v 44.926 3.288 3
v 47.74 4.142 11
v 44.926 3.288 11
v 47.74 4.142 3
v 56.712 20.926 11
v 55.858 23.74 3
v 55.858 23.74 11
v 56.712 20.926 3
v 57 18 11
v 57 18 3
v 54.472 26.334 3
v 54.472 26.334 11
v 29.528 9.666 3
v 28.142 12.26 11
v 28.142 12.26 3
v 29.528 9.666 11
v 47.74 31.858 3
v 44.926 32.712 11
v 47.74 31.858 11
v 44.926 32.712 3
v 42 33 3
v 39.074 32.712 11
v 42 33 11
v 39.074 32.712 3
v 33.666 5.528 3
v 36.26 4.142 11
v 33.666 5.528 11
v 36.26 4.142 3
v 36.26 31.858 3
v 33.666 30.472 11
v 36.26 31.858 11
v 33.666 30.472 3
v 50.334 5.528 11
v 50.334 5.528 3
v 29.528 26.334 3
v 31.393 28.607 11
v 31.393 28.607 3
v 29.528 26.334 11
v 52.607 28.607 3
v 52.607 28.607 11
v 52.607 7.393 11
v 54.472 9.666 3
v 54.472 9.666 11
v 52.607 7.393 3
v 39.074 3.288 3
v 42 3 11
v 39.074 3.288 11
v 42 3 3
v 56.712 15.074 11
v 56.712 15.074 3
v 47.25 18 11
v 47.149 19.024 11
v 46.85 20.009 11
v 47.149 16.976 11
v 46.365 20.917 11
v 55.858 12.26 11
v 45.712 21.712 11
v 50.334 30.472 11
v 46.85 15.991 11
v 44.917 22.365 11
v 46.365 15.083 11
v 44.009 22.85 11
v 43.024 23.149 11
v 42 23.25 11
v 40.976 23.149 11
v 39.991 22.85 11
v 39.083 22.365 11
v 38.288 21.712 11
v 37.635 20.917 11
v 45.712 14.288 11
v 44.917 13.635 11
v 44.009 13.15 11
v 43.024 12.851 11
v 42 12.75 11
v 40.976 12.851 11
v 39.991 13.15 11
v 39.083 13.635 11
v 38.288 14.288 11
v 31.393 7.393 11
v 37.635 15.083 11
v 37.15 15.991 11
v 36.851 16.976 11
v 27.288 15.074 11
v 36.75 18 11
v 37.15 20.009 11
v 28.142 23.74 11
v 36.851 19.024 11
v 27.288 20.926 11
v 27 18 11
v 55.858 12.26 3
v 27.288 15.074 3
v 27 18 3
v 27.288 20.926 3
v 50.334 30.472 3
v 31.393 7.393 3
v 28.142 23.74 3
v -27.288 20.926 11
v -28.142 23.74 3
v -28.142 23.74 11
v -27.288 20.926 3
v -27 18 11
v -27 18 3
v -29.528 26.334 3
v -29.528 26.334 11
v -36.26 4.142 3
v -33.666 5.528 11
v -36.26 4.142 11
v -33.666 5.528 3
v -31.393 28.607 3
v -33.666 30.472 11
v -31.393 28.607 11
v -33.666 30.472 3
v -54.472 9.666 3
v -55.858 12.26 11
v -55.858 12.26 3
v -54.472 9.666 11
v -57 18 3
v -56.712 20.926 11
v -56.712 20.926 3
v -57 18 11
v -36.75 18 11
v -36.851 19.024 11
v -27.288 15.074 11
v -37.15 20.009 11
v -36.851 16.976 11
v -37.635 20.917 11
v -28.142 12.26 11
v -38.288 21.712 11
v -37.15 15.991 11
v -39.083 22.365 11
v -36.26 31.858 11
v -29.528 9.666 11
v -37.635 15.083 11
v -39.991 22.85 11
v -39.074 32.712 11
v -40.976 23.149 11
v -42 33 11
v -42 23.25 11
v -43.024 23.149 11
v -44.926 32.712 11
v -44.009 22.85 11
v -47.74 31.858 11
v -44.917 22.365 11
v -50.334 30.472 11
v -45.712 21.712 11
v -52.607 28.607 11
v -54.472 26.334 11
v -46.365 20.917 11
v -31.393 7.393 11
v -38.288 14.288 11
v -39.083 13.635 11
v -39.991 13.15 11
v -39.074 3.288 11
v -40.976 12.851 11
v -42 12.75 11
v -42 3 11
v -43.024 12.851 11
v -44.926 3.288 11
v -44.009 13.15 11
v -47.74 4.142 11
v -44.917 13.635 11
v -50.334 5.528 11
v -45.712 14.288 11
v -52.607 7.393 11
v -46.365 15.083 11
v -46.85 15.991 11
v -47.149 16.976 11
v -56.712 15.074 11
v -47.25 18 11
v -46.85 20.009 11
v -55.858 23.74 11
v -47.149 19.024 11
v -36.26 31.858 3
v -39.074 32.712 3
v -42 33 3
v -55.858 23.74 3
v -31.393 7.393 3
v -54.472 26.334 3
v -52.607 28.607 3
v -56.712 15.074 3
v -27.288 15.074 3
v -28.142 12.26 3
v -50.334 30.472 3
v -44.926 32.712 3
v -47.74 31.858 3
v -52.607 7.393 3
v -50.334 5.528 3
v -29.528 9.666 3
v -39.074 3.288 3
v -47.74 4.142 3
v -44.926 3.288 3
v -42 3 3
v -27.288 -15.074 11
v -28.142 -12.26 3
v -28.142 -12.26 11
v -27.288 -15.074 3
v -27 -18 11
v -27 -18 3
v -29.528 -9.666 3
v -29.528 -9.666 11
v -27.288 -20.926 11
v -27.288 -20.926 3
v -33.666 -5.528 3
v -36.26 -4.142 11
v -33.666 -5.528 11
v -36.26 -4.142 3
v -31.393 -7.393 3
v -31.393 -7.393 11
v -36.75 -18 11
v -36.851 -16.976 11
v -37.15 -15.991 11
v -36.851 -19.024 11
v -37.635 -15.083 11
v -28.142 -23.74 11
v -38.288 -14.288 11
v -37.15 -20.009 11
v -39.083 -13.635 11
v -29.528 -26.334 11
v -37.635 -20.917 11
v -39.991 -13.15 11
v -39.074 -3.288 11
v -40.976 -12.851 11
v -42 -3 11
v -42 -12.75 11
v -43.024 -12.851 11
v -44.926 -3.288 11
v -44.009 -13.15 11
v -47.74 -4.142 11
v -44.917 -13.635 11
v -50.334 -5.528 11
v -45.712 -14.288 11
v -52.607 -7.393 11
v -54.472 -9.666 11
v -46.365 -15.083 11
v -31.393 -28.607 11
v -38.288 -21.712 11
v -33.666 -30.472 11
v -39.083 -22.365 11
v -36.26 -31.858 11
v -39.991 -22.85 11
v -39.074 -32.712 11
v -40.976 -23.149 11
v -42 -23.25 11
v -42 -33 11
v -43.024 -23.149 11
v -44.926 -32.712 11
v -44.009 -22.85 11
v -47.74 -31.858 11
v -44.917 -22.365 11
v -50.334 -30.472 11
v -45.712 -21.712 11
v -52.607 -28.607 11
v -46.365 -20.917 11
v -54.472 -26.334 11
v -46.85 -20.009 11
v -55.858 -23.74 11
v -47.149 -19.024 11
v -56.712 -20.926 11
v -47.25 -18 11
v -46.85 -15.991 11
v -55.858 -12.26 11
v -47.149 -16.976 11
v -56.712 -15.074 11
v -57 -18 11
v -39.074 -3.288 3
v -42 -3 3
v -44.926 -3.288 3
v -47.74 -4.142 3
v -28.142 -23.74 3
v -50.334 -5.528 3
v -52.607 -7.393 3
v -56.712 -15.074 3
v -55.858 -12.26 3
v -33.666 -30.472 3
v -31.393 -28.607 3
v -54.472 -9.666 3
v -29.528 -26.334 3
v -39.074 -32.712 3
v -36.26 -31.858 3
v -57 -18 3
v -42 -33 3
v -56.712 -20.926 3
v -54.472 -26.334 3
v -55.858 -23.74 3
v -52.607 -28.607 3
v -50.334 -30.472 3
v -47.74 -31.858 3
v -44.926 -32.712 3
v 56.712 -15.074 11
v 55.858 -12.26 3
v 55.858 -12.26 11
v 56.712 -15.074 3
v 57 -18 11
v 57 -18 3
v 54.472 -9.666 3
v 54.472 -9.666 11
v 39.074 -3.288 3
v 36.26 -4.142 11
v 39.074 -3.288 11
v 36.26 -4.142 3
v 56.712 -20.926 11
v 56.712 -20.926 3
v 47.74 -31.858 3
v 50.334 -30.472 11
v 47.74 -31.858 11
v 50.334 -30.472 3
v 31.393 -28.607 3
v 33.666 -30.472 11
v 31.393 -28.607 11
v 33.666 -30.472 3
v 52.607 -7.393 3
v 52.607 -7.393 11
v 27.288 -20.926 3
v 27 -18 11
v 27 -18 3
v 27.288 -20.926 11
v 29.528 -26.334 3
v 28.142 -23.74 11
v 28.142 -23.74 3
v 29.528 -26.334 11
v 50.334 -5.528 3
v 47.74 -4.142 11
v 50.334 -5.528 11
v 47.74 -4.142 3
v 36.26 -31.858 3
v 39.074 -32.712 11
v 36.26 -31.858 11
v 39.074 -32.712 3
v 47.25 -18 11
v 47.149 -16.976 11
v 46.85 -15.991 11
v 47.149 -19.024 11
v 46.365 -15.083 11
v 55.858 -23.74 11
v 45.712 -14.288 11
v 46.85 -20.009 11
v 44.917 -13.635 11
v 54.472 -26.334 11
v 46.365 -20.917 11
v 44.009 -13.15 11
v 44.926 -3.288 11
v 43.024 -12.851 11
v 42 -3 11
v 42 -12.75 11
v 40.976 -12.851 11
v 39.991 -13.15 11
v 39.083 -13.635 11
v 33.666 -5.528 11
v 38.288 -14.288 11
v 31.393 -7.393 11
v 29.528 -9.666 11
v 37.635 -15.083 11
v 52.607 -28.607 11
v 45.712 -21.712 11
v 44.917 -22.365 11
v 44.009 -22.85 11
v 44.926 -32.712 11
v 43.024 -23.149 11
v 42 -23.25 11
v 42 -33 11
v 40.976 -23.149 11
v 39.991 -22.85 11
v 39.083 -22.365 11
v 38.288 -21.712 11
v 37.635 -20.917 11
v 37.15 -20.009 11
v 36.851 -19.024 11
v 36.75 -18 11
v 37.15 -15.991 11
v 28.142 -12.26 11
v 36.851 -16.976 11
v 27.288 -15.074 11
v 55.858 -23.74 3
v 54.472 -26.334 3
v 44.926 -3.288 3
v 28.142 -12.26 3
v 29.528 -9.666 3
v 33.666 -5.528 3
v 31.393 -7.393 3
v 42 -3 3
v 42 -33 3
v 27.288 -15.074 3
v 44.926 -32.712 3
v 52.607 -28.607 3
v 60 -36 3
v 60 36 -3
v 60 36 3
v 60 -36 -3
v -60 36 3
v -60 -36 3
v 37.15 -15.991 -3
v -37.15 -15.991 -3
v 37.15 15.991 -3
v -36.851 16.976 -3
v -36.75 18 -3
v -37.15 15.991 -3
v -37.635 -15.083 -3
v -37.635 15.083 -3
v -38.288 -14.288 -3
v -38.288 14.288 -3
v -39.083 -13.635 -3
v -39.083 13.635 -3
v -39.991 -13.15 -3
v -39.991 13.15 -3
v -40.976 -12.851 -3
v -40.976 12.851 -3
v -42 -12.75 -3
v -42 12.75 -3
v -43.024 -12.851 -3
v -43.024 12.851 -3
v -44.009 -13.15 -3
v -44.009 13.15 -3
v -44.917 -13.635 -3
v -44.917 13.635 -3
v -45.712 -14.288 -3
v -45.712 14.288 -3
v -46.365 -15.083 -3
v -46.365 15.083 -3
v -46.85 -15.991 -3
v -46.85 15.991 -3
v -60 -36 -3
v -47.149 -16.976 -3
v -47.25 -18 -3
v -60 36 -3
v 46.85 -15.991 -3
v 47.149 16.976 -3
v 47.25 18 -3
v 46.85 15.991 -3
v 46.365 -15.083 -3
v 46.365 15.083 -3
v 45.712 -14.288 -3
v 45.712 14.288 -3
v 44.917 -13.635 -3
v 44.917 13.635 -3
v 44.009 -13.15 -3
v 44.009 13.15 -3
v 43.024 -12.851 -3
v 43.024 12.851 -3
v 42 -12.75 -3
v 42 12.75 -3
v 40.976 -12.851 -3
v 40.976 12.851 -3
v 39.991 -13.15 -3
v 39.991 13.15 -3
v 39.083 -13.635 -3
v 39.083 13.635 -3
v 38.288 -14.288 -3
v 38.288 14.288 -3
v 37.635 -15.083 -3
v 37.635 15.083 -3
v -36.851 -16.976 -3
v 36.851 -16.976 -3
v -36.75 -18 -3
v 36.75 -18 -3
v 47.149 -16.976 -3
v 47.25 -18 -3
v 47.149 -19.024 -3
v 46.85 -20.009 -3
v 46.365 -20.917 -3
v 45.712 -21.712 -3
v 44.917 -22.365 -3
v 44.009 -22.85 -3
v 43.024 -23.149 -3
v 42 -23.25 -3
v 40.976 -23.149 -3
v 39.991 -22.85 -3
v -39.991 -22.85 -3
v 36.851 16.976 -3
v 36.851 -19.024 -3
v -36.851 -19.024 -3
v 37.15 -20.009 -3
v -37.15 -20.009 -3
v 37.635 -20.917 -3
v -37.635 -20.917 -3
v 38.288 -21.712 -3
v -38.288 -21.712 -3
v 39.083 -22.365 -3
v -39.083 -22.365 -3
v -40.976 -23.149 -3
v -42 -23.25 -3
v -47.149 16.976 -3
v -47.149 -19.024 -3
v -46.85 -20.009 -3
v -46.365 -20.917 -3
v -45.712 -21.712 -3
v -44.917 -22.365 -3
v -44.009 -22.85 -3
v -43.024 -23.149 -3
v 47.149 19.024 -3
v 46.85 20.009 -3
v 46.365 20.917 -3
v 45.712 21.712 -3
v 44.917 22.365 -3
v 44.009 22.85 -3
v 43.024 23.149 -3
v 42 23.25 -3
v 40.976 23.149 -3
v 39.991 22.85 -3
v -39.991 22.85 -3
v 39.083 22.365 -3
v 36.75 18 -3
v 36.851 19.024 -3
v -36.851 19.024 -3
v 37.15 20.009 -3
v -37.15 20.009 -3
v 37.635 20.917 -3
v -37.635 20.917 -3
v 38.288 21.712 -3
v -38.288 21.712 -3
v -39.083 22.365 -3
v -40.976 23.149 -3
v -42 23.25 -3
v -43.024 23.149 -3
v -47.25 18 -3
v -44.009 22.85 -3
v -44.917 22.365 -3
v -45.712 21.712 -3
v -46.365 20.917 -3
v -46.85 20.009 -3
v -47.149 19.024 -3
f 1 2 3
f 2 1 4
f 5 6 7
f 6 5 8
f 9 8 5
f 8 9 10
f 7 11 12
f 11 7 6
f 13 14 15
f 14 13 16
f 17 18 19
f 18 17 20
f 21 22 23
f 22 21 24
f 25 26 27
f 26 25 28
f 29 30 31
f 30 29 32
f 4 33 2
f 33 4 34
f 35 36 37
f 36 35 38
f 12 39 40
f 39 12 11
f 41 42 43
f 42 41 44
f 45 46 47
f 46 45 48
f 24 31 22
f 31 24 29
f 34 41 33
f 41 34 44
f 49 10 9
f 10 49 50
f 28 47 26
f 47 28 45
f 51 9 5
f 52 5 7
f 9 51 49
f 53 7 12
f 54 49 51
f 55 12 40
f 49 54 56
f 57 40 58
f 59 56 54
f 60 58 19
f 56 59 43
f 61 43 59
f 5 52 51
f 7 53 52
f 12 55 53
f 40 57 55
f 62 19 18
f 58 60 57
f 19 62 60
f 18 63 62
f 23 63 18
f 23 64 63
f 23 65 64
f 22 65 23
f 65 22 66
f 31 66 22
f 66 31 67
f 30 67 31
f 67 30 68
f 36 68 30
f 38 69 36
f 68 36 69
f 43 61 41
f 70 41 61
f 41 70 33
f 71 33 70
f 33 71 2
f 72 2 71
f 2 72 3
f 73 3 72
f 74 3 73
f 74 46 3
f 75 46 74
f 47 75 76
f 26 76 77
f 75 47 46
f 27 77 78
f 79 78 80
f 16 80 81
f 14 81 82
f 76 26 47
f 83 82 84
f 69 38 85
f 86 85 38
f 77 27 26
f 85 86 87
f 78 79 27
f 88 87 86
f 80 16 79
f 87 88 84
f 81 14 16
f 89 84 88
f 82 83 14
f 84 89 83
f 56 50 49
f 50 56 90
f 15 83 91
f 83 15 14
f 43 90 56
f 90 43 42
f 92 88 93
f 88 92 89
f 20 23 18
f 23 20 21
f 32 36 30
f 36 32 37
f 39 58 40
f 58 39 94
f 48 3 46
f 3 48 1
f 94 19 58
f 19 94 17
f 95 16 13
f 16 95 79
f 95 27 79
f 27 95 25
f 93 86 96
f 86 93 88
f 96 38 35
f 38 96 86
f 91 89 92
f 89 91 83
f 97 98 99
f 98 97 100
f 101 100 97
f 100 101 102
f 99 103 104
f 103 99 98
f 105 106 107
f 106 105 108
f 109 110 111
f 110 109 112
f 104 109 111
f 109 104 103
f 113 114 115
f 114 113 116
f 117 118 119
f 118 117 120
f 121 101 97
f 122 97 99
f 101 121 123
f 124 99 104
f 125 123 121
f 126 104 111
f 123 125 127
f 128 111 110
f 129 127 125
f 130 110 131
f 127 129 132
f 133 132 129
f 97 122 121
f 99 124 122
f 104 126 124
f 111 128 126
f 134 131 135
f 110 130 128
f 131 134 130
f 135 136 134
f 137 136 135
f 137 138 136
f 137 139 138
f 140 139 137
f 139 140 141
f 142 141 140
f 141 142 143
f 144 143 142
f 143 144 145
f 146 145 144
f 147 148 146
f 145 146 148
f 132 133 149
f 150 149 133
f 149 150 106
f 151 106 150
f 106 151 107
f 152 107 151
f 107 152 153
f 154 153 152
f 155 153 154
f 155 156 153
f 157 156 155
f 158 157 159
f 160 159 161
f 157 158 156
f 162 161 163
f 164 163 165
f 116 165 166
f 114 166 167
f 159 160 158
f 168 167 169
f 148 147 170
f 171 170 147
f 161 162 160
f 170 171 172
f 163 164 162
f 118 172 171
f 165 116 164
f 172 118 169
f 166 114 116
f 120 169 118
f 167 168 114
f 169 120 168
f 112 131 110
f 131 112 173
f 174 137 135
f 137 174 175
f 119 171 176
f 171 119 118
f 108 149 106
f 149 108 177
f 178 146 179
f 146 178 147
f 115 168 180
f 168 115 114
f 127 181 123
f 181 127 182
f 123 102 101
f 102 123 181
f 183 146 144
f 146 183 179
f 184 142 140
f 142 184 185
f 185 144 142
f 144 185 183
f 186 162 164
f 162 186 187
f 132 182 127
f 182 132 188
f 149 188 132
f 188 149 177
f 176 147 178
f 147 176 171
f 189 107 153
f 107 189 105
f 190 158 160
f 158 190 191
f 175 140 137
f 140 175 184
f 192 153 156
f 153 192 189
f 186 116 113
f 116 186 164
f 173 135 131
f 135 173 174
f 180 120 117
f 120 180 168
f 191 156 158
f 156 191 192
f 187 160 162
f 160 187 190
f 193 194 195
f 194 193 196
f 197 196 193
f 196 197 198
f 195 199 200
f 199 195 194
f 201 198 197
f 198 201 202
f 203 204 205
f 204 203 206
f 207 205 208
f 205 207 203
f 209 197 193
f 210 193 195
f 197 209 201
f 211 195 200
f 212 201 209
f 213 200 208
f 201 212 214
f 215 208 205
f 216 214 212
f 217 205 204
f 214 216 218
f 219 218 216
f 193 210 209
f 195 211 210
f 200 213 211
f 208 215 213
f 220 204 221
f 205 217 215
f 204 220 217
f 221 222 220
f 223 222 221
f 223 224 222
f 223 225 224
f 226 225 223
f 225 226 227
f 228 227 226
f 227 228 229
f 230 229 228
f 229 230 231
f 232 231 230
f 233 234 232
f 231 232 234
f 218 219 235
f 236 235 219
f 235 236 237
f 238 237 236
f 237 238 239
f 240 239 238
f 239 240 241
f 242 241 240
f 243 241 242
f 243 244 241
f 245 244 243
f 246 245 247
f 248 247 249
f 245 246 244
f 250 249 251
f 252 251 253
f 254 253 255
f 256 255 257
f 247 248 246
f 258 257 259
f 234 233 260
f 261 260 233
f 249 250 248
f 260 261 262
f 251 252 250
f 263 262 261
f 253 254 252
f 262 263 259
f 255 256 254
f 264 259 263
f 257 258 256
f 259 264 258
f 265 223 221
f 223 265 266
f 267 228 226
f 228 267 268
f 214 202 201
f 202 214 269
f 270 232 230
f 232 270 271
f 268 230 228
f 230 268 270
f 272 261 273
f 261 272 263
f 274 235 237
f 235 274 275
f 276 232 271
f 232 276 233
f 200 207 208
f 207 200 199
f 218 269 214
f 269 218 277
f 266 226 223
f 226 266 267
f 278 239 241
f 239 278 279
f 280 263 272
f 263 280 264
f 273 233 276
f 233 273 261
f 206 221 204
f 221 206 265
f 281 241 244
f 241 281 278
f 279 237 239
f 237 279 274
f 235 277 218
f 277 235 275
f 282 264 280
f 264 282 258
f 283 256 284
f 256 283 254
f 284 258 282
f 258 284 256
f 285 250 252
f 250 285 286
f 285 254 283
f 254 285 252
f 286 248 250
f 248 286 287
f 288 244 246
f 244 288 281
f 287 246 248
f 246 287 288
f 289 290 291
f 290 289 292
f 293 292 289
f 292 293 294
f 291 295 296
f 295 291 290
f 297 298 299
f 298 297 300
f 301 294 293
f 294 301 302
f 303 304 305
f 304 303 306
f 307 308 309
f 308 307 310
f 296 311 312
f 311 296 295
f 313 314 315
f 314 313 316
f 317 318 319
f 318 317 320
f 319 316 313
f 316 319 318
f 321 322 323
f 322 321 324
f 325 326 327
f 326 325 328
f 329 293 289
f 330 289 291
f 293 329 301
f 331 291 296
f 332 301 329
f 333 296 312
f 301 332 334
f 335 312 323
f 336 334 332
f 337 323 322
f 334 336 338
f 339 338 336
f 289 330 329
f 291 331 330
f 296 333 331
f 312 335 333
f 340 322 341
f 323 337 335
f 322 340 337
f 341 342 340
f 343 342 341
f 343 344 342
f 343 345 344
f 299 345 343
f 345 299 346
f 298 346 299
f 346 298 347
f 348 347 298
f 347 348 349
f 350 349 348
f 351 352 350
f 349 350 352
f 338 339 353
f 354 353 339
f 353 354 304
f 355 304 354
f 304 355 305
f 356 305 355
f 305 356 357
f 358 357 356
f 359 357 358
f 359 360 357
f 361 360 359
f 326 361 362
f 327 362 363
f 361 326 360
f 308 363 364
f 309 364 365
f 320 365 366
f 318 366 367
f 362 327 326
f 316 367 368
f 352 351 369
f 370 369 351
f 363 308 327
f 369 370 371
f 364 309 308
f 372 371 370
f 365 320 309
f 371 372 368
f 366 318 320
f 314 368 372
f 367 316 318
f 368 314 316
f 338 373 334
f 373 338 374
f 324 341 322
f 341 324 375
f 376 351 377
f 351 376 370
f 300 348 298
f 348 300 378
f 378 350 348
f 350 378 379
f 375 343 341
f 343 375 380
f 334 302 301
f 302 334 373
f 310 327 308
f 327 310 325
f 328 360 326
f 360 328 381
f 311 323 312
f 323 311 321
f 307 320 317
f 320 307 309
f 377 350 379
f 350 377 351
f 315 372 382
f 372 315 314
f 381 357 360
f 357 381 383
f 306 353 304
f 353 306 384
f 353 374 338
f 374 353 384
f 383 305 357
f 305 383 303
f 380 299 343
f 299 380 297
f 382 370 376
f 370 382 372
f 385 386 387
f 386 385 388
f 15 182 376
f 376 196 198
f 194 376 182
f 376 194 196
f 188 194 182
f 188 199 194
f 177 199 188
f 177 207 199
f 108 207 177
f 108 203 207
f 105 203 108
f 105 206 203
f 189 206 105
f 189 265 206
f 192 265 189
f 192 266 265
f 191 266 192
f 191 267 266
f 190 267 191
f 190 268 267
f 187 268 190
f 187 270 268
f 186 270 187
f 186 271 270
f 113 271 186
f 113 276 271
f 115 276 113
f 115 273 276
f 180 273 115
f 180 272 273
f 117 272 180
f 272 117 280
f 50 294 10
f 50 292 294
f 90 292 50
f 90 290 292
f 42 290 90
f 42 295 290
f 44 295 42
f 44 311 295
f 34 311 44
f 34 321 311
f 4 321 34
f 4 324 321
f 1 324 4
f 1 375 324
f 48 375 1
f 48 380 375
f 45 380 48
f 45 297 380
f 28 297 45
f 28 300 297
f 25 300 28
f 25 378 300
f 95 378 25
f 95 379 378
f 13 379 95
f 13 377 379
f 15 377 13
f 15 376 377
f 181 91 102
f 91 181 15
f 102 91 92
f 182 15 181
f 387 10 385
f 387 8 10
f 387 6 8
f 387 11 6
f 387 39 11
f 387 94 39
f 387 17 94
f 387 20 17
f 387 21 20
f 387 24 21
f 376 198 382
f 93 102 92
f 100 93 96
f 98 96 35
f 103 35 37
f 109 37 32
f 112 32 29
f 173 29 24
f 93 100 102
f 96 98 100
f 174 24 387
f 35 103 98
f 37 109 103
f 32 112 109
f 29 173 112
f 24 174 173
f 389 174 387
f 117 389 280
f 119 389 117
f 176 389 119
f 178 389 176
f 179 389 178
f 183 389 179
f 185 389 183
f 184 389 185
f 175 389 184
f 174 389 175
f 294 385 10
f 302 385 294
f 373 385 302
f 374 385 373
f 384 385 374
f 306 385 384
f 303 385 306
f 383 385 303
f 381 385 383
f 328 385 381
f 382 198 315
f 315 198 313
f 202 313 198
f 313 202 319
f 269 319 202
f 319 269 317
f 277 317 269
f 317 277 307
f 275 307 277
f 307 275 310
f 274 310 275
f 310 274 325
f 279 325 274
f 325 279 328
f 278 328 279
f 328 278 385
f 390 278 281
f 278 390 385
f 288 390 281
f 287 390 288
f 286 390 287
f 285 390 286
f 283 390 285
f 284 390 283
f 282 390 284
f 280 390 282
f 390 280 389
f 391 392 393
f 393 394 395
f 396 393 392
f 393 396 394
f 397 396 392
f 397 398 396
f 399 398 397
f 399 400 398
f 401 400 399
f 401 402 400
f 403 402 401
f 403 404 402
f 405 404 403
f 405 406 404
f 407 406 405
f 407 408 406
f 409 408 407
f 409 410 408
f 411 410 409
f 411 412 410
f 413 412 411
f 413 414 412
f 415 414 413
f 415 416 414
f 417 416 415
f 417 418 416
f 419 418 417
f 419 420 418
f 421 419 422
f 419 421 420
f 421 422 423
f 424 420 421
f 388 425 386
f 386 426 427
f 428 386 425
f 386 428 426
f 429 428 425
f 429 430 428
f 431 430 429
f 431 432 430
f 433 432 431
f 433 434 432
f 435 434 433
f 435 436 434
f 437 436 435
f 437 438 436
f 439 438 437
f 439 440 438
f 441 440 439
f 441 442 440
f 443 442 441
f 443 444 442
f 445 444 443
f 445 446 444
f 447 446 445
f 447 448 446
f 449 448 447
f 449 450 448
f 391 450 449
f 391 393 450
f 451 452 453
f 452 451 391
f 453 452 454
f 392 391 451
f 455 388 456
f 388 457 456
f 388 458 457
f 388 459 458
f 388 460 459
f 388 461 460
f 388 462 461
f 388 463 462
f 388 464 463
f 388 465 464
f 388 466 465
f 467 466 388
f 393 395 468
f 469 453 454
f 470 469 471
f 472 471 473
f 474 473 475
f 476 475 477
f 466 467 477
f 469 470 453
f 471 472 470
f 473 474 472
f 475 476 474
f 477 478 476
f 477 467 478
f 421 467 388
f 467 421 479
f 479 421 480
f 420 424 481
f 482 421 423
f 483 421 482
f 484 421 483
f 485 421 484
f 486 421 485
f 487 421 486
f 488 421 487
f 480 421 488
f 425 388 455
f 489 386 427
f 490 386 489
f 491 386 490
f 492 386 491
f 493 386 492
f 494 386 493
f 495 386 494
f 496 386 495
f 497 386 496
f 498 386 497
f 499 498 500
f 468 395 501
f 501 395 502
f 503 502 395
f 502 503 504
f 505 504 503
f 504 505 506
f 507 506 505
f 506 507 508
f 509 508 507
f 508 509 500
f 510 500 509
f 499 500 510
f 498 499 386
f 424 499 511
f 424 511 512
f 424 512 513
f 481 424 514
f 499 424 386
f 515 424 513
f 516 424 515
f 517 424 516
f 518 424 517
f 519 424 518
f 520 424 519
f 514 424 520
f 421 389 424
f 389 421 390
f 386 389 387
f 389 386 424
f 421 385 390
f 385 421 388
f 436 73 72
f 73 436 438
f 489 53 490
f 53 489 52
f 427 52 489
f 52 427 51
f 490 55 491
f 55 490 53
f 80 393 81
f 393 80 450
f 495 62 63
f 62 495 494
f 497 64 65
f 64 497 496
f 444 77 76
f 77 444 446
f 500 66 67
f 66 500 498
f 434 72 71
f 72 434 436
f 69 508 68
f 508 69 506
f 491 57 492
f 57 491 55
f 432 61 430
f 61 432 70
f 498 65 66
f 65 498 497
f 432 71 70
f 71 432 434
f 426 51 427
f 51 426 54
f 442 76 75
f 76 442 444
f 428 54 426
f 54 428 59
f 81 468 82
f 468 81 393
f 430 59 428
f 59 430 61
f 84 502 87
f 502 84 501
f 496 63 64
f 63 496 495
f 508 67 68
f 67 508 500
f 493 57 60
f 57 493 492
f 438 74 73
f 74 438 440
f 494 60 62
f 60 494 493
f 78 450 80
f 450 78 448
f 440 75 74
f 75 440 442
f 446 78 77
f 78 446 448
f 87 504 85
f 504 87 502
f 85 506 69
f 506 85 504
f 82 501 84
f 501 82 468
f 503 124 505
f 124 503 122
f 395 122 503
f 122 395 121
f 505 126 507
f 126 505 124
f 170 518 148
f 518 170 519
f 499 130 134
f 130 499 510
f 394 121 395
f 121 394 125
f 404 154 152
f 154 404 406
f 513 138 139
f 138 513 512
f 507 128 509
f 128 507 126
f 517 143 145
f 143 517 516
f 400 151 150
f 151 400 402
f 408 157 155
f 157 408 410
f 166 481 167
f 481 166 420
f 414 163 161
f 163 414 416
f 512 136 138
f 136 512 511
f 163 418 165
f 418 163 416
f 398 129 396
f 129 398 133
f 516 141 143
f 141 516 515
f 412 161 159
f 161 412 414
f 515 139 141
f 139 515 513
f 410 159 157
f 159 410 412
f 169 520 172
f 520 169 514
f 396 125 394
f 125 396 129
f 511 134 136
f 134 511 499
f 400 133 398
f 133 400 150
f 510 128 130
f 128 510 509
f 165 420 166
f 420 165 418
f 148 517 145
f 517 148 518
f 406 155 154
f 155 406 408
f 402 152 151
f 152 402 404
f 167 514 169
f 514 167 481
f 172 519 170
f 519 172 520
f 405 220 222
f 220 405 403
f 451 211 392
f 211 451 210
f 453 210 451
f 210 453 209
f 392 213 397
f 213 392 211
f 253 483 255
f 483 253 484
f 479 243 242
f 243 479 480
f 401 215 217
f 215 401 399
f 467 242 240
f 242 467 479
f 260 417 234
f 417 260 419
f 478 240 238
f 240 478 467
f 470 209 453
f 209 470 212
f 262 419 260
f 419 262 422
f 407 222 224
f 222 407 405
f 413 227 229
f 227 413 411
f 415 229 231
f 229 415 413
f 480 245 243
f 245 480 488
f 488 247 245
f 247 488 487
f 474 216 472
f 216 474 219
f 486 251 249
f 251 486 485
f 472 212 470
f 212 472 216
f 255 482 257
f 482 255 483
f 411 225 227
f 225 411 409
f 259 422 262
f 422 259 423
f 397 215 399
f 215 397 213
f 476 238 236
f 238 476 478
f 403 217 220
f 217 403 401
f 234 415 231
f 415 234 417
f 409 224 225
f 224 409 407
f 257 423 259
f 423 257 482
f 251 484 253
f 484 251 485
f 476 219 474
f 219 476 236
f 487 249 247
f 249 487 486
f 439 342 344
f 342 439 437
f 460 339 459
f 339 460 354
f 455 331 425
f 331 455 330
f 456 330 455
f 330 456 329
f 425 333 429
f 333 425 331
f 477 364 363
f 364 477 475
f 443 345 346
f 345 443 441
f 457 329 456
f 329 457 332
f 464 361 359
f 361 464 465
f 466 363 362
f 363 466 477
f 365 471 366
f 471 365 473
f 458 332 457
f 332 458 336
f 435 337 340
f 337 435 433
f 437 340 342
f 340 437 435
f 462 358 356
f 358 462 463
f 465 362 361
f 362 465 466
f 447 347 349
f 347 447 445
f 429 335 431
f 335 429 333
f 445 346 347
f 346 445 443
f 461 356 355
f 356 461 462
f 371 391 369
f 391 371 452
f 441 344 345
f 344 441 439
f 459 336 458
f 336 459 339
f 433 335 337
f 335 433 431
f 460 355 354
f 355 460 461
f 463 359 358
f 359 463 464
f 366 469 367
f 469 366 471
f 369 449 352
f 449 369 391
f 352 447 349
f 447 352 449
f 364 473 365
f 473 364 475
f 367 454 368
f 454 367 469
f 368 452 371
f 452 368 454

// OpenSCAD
$fn = 32;

// ----------------------------------------------------------------------
// Anchor pads 120 x 72 x 14
// four corner bosses with anchor holes
// ----------------------------------------------------------------------

// --- parameters (mm) ---
plate = [120, 72, 6];  // base plate size (x, y, z)
pads = 4;              // boss count, one per corner
edge = 18;             // boss centre offset from the plate edge
boss_d = 30;           // boss diameter
boss_h = 8;            // boss height above the base plate
hole_d = 10.5;         // hole diameter

// --- derived feature positions (mm) ---
height = plate[2] + boss_h;      // = 14   overall height of the part
corner_x = plate[0] / 2 - edge;  // = 42   boss centre X
corner_y = plate[1] / 2 - edge;  // = 18   boss centre Y
feature_centers = [
  [corner_x, corner_y],
  [-corner_x, corner_y],
  [-corner_x, -corner_y],
  [corner_x, -corner_y]
];   // boss centres, anchor holes are drilled there

// base plate, four bosses standing on it, anchor holes all the way through
difference() {
  union() {
    cube(plate, center = true);
    for (centre = feature_centers)
      translate([centre[0], centre[1], plate[2] / 2 - 1])
        cylinder(d = boss_d, h = boss_h + 1);
  }
  for (centre = feature_centers)
    translate([centre[0], centre[1], -height])
      cylinder(d = hole_d, h = 2 * height + 2);  // through boss and plate
}
